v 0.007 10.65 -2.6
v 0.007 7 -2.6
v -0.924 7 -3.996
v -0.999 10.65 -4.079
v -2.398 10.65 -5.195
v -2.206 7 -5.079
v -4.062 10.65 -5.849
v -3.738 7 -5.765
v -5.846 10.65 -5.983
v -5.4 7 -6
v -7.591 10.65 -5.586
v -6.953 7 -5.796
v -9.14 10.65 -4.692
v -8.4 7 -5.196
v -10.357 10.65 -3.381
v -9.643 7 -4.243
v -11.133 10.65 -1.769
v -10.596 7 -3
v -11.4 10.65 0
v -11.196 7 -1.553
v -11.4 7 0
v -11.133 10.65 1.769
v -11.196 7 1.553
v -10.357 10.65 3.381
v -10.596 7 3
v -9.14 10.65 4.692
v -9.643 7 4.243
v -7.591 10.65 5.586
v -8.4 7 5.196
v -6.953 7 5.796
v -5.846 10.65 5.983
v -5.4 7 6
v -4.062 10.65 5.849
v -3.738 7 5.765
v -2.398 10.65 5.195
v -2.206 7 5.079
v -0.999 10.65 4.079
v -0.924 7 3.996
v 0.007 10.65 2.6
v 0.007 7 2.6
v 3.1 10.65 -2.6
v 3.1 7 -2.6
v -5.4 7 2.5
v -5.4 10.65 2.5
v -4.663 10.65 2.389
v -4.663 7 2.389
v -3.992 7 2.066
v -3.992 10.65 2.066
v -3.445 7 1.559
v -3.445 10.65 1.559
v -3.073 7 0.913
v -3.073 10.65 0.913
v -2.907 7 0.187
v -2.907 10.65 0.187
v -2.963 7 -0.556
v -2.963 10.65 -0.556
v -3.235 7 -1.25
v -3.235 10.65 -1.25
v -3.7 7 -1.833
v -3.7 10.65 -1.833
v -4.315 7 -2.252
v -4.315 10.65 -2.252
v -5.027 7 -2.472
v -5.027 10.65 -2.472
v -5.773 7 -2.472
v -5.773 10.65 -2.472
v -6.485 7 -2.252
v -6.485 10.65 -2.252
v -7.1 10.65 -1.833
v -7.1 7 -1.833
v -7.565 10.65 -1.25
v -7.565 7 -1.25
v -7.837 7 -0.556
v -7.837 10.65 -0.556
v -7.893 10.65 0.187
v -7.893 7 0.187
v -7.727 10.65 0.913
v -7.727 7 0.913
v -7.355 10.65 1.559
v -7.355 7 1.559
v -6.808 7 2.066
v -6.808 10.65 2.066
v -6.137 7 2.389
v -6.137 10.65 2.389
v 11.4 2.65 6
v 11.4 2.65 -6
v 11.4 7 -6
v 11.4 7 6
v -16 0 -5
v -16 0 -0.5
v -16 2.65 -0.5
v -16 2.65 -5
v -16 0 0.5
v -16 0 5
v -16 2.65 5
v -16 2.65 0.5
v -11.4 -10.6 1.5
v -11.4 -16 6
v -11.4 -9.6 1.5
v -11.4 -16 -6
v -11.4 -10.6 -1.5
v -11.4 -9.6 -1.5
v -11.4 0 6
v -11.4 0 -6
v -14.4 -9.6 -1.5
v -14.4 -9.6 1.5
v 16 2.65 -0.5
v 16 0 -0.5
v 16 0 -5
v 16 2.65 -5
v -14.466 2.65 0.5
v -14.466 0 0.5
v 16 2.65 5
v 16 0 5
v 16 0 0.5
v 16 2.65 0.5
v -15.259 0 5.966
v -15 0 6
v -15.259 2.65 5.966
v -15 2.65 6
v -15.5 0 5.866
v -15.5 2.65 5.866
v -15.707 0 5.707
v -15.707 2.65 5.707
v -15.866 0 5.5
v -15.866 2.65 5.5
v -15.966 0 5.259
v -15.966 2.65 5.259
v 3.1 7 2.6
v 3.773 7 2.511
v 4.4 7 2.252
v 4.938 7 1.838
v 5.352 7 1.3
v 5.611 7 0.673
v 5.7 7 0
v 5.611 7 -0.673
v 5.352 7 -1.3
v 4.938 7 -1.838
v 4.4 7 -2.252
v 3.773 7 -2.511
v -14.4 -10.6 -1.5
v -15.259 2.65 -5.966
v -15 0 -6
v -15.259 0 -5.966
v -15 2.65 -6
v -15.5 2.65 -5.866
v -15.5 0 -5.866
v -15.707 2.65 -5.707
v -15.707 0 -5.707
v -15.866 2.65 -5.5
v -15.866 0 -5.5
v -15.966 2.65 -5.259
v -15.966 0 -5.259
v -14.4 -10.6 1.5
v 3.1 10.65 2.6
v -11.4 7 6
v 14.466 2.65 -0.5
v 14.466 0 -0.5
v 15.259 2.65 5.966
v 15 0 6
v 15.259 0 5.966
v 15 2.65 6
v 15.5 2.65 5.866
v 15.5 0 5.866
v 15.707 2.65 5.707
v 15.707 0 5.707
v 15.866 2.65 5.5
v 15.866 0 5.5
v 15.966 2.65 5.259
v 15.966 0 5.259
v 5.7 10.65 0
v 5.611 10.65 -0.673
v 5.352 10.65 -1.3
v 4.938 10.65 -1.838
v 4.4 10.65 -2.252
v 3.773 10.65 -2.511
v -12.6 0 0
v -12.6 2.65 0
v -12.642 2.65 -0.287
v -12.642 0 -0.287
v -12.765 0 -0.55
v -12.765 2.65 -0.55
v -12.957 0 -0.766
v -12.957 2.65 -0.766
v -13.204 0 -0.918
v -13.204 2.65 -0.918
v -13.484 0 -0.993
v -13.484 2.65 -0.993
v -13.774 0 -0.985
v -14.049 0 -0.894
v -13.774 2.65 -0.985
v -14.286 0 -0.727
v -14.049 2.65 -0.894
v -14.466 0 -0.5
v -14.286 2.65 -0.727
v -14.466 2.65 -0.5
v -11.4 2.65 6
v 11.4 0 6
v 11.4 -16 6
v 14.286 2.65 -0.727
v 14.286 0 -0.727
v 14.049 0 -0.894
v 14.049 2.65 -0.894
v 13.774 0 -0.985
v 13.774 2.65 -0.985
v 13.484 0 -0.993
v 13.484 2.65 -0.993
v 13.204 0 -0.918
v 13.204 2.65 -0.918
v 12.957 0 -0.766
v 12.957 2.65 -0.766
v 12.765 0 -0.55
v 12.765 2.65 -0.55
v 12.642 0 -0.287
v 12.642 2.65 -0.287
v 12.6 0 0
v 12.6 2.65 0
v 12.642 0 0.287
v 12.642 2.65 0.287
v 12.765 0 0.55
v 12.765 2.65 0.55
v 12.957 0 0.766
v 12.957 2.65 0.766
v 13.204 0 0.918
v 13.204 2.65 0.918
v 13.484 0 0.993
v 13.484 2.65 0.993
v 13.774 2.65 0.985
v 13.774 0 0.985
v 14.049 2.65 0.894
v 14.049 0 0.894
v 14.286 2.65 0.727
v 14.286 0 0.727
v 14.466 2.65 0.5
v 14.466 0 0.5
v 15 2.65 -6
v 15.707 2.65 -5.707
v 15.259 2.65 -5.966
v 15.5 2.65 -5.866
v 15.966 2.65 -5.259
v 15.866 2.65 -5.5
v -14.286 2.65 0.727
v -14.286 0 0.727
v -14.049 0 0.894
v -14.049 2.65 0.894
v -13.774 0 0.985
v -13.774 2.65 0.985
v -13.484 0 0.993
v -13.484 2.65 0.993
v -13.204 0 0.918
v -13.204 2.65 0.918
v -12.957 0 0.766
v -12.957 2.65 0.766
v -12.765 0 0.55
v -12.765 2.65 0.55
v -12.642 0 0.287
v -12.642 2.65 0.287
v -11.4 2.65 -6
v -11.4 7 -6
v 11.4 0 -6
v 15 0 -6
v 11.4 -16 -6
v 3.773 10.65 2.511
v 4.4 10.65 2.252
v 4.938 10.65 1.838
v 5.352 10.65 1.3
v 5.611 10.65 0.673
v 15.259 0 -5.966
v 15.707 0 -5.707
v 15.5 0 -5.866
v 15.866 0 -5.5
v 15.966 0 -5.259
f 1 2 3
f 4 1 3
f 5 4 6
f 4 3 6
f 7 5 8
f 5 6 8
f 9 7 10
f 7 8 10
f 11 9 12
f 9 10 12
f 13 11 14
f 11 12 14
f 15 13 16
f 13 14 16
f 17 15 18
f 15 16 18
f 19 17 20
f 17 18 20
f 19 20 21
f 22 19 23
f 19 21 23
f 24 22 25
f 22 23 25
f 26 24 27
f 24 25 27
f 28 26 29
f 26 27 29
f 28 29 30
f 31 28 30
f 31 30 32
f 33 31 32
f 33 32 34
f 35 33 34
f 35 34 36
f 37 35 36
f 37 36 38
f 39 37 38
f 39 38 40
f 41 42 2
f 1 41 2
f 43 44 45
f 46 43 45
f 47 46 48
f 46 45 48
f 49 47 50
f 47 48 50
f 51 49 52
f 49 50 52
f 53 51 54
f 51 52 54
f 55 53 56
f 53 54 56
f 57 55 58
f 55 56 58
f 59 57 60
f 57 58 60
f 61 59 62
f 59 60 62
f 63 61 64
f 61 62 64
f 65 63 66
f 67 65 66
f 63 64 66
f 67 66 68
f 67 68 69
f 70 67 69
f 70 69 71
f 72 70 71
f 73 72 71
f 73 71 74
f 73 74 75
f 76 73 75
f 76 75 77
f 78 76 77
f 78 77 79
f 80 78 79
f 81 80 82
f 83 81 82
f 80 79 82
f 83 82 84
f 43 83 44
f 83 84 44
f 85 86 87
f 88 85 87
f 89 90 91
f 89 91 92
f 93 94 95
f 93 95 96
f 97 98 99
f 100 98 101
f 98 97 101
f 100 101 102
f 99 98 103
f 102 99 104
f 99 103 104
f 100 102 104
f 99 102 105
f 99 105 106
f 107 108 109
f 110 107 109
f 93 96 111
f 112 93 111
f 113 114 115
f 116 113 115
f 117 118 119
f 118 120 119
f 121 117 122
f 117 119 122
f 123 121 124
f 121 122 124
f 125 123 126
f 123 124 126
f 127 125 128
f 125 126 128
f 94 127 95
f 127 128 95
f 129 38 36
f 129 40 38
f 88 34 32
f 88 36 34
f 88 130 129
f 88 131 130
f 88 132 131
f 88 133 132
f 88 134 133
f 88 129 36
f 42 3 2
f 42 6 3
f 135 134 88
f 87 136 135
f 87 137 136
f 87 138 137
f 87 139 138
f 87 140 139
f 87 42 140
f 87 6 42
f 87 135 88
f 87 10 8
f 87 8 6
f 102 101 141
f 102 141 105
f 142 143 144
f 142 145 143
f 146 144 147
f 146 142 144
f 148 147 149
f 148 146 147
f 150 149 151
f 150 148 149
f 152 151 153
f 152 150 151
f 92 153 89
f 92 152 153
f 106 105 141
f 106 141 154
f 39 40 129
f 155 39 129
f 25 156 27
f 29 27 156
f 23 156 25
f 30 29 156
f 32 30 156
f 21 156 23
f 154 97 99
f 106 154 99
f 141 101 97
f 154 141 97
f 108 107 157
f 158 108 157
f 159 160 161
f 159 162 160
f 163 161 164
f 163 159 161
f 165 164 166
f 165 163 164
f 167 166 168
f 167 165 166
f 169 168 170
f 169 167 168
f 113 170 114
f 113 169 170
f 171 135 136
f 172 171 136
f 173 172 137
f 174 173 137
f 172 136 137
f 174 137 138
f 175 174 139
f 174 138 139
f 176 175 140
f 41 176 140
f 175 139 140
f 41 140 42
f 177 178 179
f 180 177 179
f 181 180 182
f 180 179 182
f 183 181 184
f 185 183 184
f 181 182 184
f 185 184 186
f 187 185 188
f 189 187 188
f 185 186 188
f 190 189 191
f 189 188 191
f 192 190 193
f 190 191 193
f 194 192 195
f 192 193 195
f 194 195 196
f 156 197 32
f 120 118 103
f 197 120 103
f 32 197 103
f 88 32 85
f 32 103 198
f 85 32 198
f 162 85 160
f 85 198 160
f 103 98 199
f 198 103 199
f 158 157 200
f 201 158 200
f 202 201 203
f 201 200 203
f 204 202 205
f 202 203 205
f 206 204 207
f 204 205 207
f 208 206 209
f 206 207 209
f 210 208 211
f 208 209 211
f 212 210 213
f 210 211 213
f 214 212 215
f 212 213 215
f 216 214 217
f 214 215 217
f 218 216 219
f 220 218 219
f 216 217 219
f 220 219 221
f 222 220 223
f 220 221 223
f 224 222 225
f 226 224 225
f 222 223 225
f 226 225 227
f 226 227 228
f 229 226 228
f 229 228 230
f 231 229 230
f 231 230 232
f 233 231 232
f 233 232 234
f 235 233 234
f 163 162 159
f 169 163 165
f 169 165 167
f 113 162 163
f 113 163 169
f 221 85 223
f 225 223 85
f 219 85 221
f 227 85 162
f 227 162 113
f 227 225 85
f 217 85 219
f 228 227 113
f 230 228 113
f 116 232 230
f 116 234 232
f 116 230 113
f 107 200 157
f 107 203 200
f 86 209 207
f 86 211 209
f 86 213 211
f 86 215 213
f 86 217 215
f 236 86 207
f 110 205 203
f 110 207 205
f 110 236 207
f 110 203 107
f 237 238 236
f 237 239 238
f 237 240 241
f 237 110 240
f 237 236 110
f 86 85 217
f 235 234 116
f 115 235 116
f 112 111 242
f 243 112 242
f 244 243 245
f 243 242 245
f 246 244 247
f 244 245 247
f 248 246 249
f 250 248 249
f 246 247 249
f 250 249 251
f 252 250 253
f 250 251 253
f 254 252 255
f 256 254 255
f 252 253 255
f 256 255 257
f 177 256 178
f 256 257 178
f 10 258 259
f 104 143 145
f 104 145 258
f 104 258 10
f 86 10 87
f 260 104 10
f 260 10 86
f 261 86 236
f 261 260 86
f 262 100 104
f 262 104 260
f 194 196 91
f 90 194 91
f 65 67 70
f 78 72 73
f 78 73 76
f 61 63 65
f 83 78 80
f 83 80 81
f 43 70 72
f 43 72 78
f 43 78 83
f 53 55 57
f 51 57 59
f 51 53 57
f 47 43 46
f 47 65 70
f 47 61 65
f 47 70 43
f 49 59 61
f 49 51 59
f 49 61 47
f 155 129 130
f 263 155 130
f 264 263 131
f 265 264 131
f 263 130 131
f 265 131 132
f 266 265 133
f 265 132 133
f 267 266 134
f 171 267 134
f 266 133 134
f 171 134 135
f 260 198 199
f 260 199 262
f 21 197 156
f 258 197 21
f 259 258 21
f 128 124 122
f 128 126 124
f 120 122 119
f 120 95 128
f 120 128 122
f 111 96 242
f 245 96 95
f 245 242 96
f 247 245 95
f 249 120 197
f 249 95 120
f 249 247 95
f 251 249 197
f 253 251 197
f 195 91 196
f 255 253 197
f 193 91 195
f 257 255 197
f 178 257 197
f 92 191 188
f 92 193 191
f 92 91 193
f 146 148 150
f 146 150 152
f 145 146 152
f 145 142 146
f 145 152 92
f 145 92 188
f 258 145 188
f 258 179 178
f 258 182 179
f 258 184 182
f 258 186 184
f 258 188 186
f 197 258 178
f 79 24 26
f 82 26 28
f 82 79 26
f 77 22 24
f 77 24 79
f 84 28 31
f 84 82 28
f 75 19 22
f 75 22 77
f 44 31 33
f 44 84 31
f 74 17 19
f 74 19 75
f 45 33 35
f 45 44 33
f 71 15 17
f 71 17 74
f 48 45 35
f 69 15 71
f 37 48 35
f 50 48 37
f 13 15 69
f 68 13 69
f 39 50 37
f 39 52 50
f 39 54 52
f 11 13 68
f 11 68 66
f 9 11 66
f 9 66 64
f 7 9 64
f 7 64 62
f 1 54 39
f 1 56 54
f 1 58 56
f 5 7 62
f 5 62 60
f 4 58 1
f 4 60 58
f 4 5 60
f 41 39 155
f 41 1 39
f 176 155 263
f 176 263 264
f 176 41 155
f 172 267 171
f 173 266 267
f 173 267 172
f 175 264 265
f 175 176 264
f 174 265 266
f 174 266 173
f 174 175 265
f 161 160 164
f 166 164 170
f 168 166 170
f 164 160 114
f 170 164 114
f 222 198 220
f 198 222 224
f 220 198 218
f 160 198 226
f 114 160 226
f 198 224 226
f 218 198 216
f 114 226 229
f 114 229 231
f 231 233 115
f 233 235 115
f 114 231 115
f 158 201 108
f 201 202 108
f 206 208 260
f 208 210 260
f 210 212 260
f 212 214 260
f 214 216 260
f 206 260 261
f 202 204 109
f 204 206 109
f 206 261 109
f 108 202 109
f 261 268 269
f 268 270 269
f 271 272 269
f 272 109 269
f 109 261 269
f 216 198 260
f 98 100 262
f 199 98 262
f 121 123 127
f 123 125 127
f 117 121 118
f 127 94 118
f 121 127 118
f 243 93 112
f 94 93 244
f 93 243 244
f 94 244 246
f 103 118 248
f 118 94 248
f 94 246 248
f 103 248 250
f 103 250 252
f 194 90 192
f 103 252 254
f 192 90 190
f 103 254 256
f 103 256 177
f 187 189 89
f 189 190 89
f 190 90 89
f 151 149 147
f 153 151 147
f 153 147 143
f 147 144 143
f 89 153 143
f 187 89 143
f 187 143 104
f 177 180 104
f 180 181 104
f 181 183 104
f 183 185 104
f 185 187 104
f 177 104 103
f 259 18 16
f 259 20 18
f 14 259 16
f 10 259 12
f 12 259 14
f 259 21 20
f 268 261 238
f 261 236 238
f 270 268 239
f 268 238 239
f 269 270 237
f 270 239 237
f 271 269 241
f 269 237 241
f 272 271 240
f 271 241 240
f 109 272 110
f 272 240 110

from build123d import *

# Parameters (mm, degrees)
SKETCH1_W                       = 22.8
SKETCH1_H                       = 12
BOSS_EXTRUDE1_DEPTH             = 16
SKETCH2_W                       = 32
SKETCH2_H                       = 12
BOSS_EXTRUDE2_DEPTH             = 2.65
BOSS_EXTRUDE3_REACH             = 25.409
SKETCH3_W                       = 22.8
SKETCH3_H                       = 23
BOSS_EXTRUDE3_DIRECTION_2_REACH = 25.409
CUT_EXTRUDE1_REACH              = 27.295
FILLET1_R                       = 1
SKETCH5_R                       = 6
BOSS_EXTRUDE4_DEPTH             = 3.65
BOSS_EXTRUDE5_DEPTH             = 3.65
SKETCH7_R                       = 2.5
CUT_EXTRUDE2_DEPTH              = 3.65
SKETCH8_W                       = 3
SKETCH8_H                       = 1
BOSS_EXTRUDE6_DEPTH             = 3


with BuildPart() as part:
    # Sketch1 → Boss-Extrude1 (new body)
    with BuildSketch(Plane(origin=(0, 0, 0), x_dir=(1, 0, 0), z_dir=(0, 1, 0))):
        Rectangle(SKETCH1_W, SKETCH1_H)
    extrude(amount=-BOSS_EXTRUDE1_DEPTH)

    # Sketch2 → Boss-Extrude2 (add)
    with BuildSketch(Plane(origin=(0, 0, 0), x_dir=(1, 0, 0), z_dir=(0, 1, 0))):
        Rectangle(SKETCH2_W, SKETCH2_H)
    extrude(amount=BOSS_EXTRUDE2_DEPTH)

    # Boss-Extrude3: up to this face of the body (flat: up to its plane)
    boss_extrude3_end = Plane(part.part.faces().sort_by_distance((0, -6.241192171, 6))[0])
    # Sketch3 → Boss-Extrude3 (add, up to the picked face)
    with BuildSketch(Plane.XY, mode=Mode.PRIVATE) as boss_extrude3_sk1:
        with Locations((0, -4.5)):
            Rectangle(SKETCH3_W, SKETCH3_H)
    boss_extrude3_tool1 = split(extrude(boss_extrude3_sk1.sketch, amount=BOSS_EXTRUDE3_REACH, mode=Mode.PRIVATE), bisect_by=boss_extrude3_end, keep=Keep.BOTH, mode=Mode.PRIVATE)
    add(boss_extrude3_tool1.solids().sort_by(Axis((0, -4.5, 0), (0, 0, 1)))[0])

    # Boss-Extrude3 direction 2: up to this face of the body (flat: up to its plane)
    boss_extrude3_direction_2_end = Plane(part.part.faces().sort_by_distance((0, -6.241192171, -6))[0])
    # Sketch3 → Boss-Extrude3 direction 2 (add, up to the picked face)
    with BuildSketch(Plane.XY, mode=Mode.PRIVATE) as boss_extrude3_direction_2_sk1:
        with Locations((0, -4.5)):
            Rectangle(SKETCH3_W, SKETCH3_H)
    boss_extrude3_direction_2_tool1 = split(extrude(boss_extrude3_direction_2_sk1.sketch, amount=-BOSS_EXTRUDE3_DIRECTION_2_REACH, mode=Mode.PRIVATE), bisect_by=boss_extrude3_direction_2_end, keep=Keep.BOTH, mode=Mode.PRIVATE)
    add(boss_extrude3_direction_2_tool1.solids().sort_by(Axis((0, -4.5, 0), (0, 0, -1)))[0])

    # Sketch4 → Cut-Extrude1 (cut, up to next)
    with BuildSketch(Plane(origin=(0, 2.65, 0), x_dir=(1, 0, 0), z_dir=(0, 1, 0)), mode=Mode.PRIVATE) as cut_extrude1_sk1:
        with BuildLine():
            ThreePointArc((14.6, 0), (14.565925826, 0.258819045), (14.466025404, 0.5))
            Line((14.466025404, 0.5), (13.6, 0.5))
            Line((13.6, 0.5), (13.6, -0.5))
            Line((13.6, -0.5), (14.466025404, -0.5))
            ThreePointArc((14.466025404, -0.5), (14.565925826, -0.258819045), (14.6, 0))
        make_face()
    cut_extrude1_tool1 = extrude(cut_extrude1_sk1.sketch, amount=-CUT_EXTRUDE1_REACH, mode=Mode.PRIVATE) & part.part
    # Sketch4 → Cut-Extrude1 (cut, up to next)
    with BuildSketch(Plane(origin=(0, 2.65, 0), x_dir=(1, 0, 0), z_dir=(0, 1, 0)), mode=Mode.PRIVATE) as cut_extrude1_sk2:
        with BuildLine():
            Line((13.6, 0.5), (14.466025404, 0.5))
            ThreePointArc((14.466025404, 0.5), (12.6, 0), (14.466025404, -0.5))
            Line((14.466025404, -0.5), (13.6, -0.5))
            Line((13.6, -0.5), (13.6, 0.5))
        make_face()
    cut_extrude1_tool2 = extrude(cut_extrude1_sk2.sketch, amount=-CUT_EXTRUDE1_REACH, mode=Mode.PRIVATE) & part.part
    # Sketch4 → Cut-Extrude1 (cut, up to next)
    with BuildSketch(Plane(origin=(0, 2.65, 0), x_dir=(1, 0, 0), z_dir=(0, 1, 0)), mode=Mode.PRIVATE) as cut_extrude1_sk3:
        with BuildLine():
            ThreePointArc((14.6, 0), (14.565925826, 0.258819045), (14.466025404, 0.5))
            Line((14.466025404, 0.5), (13.6, 0.5))
            Line((13.6, 0.5), (13.6, -0.5))
            Line((13.6, -0.5), (14.466025404, -0.5))
            ThreePointArc((14.466025404, -0.5), (14.565925826, -0.258819045), (14.6, 0))
        make_face()
    cut_extrude1_tool3 = extrude(cut_extrude1_sk3.sketch, amount=-CUT_EXTRUDE1_REACH, mode=Mode.PRIVATE) & part.part
    # Sketch4 → Cut-Extrude1 (cut, up to next)
    with BuildSketch(Plane(origin=(0, 2.65, 0), x_dir=(1, 0, 0), z_dir=(0, 1, 0)), mode=Mode.PRIVATE) as cut_extrude1_sk4:
        with BuildLine():
            Line((13.6, 0.5), (14.466025404, 0.5))
            ThreePointArc((14.466025404, 0.5), (12.6, 0), (14.466025404, -0.5))
            Line((14.466025404, -0.5), (13.6, -0.5))
            Line((13.6, -0.5), (13.6, 0.5))
        make_face()
    cut_extrude1_tool4 = extrude(cut_extrude1_sk4.sketch, amount=-CUT_EXTRUDE1_REACH, mode=Mode.PRIVATE) & part.part
    # Sketch4 → Cut-Extrude1 (cut, up to next)
    with BuildSketch(Plane(origin=(0, 2.65, 0), x_dir=(1, 0, 0), z_dir=(0, 1, 0)), mode=Mode.PRIVATE) as cut_extrude1_sk5:
        with BuildLine():
            Line((16, -0.5), (16, 0.5))
            Line((16, 0.5), (14.466025404, 0.5))
            ThreePointArc((14.466025404, 0.5), (14.565925826, 0.258819045), (14.6, 0))
            ThreePointArc((14.6, 0), (14.565925826, -0.258819045), (14.466025404, -0.5))
            Line((14.466025404, -0.5), (16, -0.5))
        make_face()
    cut_extrude1_tool5 = extrude(cut_extrude1_sk5.sketch, amount=-CUT_EXTRUDE1_REACH, mode=Mode.PRIVATE) & part.part
    # Sketch4 → Cut-Extrude1 (cut, up to next)
    with BuildSketch(Plane(origin=(0, 2.65, 0), x_dir=(1, 0, 0), z_dir=(0, 1, 0)), mode=Mode.PRIVATE) as cut_extrude1_sk6:
        with BuildLine():
            Line((-14.466025404, 0.5), (-16, 0.5))
            Line((-16, 0.5), (-16, -0.5))
            Line((-16, -0.5), (-14.466025404, -0.5))
            ThreePointArc((-14.466025404, -0.5), (-14.6, 0), (-14.466025404, 0.5))
        make_face()
    cut_extrude1_tool6 = extrude(cut_extrude1_sk6.sketch, amount=-CUT_EXTRUDE1_REACH, mode=Mode.PRIVATE) & part.part
    # Sketch4 → Cut-Extrude1 (cut, up to next)
    with BuildSketch(Plane(origin=(0, 2.65, 0), x_dir=(1, 0, 0), z_dir=(0, 1, 0)), mode=Mode.PRIVATE) as cut_extrude1_sk7:
        with BuildLine():
            ThreePointArc((-12.6, 0), (-13.341180955, 0.965925826), (-14.466025404, 0.5))
            Line((-14.466025404, 0.5), (-13.6, 0.5))
            Line((-13.6, 0.5), (-13.6, -0.5))
            Line((-13.6, -0.5), (-14.466025404, -0.5))
            ThreePointArc((-14.466025404, -0.5), (-13.341180955, -0.965925826), (-12.6, 0))
        make_face()
    cut_extrude1_tool7 = extrude(cut_extrude1_sk7.sketch, amount=-CUT_EXTRUDE1_REACH, mode=Mode.PRIVATE) & part.part
    # Sketch4 → Cut-Extrude1 (cut, up to next)
    with BuildSketch(Plane(origin=(0, 2.65, 0), x_dir=(1, 0, 0), z_dir=(0, 1, 0)), mode=Mode.PRIVATE) as cut_extrude1_sk8:
        with BuildLine():
            Line((-13.6, 0.5), (-14.466025404, 0.5))
            ThreePointArc((-14.466025404, 0.5), (-14.6, 0), (-14.466025404, -0.5))
            Line((-14.466025404, -0.5), (-13.6, -0.5))
            Line((-13.6, -0.5), (-13.6, 0.5))
        make_face()
    cut_extrude1_tool8 = extrude(cut_extrude1_sk8.sketch, amount=-CUT_EXTRUDE1_REACH, mode=Mode.PRIVATE) & part.part
    # Sketch4 → Cut-Extrude1 (cut, up to next)
    with BuildSketch(Plane(origin=(0, 2.65, 0), x_dir=(1, 0, 0), z_dir=(0, 1, 0)), mode=Mode.PRIVATE) as cut_extrude1_sk9:
        with BuildLine():
            ThreePointArc((-12.6, 0), (-13.341180955, 0.965925826), (-14.466025404, 0.5))
            Line((-14.466025404, 0.5), (-13.6, 0.5))
            Line((-13.6, 0.5), (-13.6, -0.5))
            Line((-13.6, -0.5), (-14.466025404, -0.5))
            ThreePointArc((-14.466025404, -0.5), (-13.341180955, -0.965925826), (-12.6, 0))
        make_face()
    cut_extrude1_tool9 = extrude(cut_extrude1_sk9.sketch, amount=-CUT_EXTRUDE1_REACH, mode=Mode.PRIVATE) & part.part
    # Sketch4 → Cut-Extrude1 (cut, up to next)
    with BuildSketch(Plane(origin=(0, 2.65, 0), x_dir=(1, 0, 0), z_dir=(0, 1, 0)), mode=Mode.PRIVATE) as cut_extrude1_sk10:
        with BuildLine():
            Line((-13.6, 0.5), (-14.466025404, 0.5))
            ThreePointArc((-14.466025404, 0.5), (-14.6, 0), (-14.466025404, -0.5))
            Line((-14.466025404, -0.5), (-13.6, -0.5))
            Line((-13.6, -0.5), (-13.6, 0.5))
        make_face()
    cut_extrude1_tool10 = extrude(cut_extrude1_sk10.sketch, amount=-CUT_EXTRUDE1_REACH, mode=Mode.PRIVATE) & part.part
    add(cut_extrude1_tool1.solids().sort_by_distance((14.079122, 2.65, 0))[0], mode=Mode.SUBTRACT)
    add(cut_extrude1_tool2.solids().sort_by_distance((13.390235, 2.65, 0))[0], mode=Mode.SUBTRACT)
    add(cut_extrude1_tool3.solids().sort_by_distance((14.079122, 2.65, 0))[0], mode=Mode.SUBTRACT)
    add(cut_extrude1_tool4.solids().sort_by_distance((13.390235, 2.65, 0))[0], mode=Mode.SUBTRACT)
    add(cut_extrude1_tool5.solids().sort_by_distance((15.277765, 2.65, 0))[0], mode=Mode.SUBTRACT)
    add(cut_extrude1_tool6.solids().sort_by_distance((-15.277765, 2.65, 0))[0], mode=Mode.SUBTRACT)
    add(cut_extrude1_tool7.solids().sort_by_distance((-13.390235, 2.65, 0))[0], mode=Mode.SUBTRACT)
    add(cut_extrude1_tool8.solids().sort_by_distance((-14.079122, 2.65, 0))[0], mode=Mode.SUBTRACT)
    add(cut_extrude1_tool9.solids().sort_by_distance((-13.390235, 2.65, 0))[0], mode=Mode.SUBTRACT)
    add(cut_extrude1_tool10.solids().sort_by_distance((-14.079122, 2.65, 0))[0], mode=Mode.SUBTRACT)

    # Fillet1
    fillet1_edges = [part.edges().sort_by_distance(p)[0] for p in [
        (16, 1.325, 6),
        (16, 1.325, -6),
        (-16, 1.325, -6),
        (-16, 1.325, 6),
    ]]
    fillet(fillet1_edges, radius=FILLET1_R)

    # Sketch5 → Boss-Extrude4 (add)
    with BuildSketch(Plane(origin=(0, 7, 0), x_dir=(1, 0, 0), z_dir=(0, 1, 0))):
        with Locations(Location((-5.4, 0, 0), (0, 0, 270))):
            Circle(SKETCH5_R)
    extrude(amount=BOSS_EXTRUDE4_DEPTH)

    # Sketch6 → Boss-Extrude5 (add)
    with BuildSketch(Plane(origin=(0, 7, 0), x_dir=(1, 0, 0), z_dir=(0, 1, 0))):
        with BuildLine():
            Line((0.007402334, -2.6), (3.1, -2.6))
            ThreePointArc((3.1, -2.6), (1.487245955, -2.039368625), (0.57, -0.599249531))
            ThreePointArc((0.57, -0.599249531), (0.375990961, -1.624170072), (0.007402334, -2.6))
        make_face()
        with BuildLine():
            ThreePointArc((0.57, 0.599249531), (1.487245955, 2.039368625), (3.1, 2.6))
            Line((3.1, 2.6), (0.007402334, 2.6))
            ThreePointArc((0.007402334, 2.6), (0.375990961, 1.624170072), (0.57, 0.599249531))
        make_face()
        with BuildLine():
            ThreePointArc((5.7, 0), (4.938477631, 1.838477631), (3.1, 2.6))
            ThreePointArc((3.1, 2.6), (1.487245955, 2.039368625), (0.57, 0.599249531))
            ThreePointArc((0.57, 0.599249531), (0.592495307, 0.3), (0.6, 0))
            ThreePointArc((0.6, 0), (0.592495307, -0.3), (0.57, -0.599249531))
            ThreePointArc((0.57, -0.599249531), (1.487245955, -2.039368625), (3.1, -2.6))
            ThreePointArc((3.1, -2.6), (4.938477631, -1.838477631), (5.7, 0))
        make_face()
        with BuildLine():
            ThreePointArc((0.6, 0), (0.592495307, 0.3), (0.57, 0.599249531))
            ThreePointArc((0.57, 0.599249531), (0.5, 0), (0.57, -0.599249531))
            ThreePointArc((0.57, -0.599249531), (0.592495307, -0.3), (0.6, 0))
        make_face()
    extrude(amount=BOSS_EXTRUDE5_DEPTH)

    # Sketch7 → Cut-Extrude2 (cut)
    with BuildSketch(Plane(origin=(0, 10.65, 0), x_dir=(1, 0, 0), z_dir=(0, 1, 0))):
        with Locations(Location((-5.4, 0, 0), (0, 0, 270))):
            Circle(SKETCH7_R)
    extrude(amount=-CUT_EXTRUDE2_DEPTH, mode=Mode.SUBTRACT)

    # Sketch8 → Boss-Extrude6 (add)
    with BuildSketch(Plane.ZY.offset(11.4)):
        with Locations((0, -10.1)):
            Rectangle(SKETCH8_W, SKETCH8_H)
    extrude(amount=BOSS_EXTRUDE6_DEPTH)


solid = part.part
